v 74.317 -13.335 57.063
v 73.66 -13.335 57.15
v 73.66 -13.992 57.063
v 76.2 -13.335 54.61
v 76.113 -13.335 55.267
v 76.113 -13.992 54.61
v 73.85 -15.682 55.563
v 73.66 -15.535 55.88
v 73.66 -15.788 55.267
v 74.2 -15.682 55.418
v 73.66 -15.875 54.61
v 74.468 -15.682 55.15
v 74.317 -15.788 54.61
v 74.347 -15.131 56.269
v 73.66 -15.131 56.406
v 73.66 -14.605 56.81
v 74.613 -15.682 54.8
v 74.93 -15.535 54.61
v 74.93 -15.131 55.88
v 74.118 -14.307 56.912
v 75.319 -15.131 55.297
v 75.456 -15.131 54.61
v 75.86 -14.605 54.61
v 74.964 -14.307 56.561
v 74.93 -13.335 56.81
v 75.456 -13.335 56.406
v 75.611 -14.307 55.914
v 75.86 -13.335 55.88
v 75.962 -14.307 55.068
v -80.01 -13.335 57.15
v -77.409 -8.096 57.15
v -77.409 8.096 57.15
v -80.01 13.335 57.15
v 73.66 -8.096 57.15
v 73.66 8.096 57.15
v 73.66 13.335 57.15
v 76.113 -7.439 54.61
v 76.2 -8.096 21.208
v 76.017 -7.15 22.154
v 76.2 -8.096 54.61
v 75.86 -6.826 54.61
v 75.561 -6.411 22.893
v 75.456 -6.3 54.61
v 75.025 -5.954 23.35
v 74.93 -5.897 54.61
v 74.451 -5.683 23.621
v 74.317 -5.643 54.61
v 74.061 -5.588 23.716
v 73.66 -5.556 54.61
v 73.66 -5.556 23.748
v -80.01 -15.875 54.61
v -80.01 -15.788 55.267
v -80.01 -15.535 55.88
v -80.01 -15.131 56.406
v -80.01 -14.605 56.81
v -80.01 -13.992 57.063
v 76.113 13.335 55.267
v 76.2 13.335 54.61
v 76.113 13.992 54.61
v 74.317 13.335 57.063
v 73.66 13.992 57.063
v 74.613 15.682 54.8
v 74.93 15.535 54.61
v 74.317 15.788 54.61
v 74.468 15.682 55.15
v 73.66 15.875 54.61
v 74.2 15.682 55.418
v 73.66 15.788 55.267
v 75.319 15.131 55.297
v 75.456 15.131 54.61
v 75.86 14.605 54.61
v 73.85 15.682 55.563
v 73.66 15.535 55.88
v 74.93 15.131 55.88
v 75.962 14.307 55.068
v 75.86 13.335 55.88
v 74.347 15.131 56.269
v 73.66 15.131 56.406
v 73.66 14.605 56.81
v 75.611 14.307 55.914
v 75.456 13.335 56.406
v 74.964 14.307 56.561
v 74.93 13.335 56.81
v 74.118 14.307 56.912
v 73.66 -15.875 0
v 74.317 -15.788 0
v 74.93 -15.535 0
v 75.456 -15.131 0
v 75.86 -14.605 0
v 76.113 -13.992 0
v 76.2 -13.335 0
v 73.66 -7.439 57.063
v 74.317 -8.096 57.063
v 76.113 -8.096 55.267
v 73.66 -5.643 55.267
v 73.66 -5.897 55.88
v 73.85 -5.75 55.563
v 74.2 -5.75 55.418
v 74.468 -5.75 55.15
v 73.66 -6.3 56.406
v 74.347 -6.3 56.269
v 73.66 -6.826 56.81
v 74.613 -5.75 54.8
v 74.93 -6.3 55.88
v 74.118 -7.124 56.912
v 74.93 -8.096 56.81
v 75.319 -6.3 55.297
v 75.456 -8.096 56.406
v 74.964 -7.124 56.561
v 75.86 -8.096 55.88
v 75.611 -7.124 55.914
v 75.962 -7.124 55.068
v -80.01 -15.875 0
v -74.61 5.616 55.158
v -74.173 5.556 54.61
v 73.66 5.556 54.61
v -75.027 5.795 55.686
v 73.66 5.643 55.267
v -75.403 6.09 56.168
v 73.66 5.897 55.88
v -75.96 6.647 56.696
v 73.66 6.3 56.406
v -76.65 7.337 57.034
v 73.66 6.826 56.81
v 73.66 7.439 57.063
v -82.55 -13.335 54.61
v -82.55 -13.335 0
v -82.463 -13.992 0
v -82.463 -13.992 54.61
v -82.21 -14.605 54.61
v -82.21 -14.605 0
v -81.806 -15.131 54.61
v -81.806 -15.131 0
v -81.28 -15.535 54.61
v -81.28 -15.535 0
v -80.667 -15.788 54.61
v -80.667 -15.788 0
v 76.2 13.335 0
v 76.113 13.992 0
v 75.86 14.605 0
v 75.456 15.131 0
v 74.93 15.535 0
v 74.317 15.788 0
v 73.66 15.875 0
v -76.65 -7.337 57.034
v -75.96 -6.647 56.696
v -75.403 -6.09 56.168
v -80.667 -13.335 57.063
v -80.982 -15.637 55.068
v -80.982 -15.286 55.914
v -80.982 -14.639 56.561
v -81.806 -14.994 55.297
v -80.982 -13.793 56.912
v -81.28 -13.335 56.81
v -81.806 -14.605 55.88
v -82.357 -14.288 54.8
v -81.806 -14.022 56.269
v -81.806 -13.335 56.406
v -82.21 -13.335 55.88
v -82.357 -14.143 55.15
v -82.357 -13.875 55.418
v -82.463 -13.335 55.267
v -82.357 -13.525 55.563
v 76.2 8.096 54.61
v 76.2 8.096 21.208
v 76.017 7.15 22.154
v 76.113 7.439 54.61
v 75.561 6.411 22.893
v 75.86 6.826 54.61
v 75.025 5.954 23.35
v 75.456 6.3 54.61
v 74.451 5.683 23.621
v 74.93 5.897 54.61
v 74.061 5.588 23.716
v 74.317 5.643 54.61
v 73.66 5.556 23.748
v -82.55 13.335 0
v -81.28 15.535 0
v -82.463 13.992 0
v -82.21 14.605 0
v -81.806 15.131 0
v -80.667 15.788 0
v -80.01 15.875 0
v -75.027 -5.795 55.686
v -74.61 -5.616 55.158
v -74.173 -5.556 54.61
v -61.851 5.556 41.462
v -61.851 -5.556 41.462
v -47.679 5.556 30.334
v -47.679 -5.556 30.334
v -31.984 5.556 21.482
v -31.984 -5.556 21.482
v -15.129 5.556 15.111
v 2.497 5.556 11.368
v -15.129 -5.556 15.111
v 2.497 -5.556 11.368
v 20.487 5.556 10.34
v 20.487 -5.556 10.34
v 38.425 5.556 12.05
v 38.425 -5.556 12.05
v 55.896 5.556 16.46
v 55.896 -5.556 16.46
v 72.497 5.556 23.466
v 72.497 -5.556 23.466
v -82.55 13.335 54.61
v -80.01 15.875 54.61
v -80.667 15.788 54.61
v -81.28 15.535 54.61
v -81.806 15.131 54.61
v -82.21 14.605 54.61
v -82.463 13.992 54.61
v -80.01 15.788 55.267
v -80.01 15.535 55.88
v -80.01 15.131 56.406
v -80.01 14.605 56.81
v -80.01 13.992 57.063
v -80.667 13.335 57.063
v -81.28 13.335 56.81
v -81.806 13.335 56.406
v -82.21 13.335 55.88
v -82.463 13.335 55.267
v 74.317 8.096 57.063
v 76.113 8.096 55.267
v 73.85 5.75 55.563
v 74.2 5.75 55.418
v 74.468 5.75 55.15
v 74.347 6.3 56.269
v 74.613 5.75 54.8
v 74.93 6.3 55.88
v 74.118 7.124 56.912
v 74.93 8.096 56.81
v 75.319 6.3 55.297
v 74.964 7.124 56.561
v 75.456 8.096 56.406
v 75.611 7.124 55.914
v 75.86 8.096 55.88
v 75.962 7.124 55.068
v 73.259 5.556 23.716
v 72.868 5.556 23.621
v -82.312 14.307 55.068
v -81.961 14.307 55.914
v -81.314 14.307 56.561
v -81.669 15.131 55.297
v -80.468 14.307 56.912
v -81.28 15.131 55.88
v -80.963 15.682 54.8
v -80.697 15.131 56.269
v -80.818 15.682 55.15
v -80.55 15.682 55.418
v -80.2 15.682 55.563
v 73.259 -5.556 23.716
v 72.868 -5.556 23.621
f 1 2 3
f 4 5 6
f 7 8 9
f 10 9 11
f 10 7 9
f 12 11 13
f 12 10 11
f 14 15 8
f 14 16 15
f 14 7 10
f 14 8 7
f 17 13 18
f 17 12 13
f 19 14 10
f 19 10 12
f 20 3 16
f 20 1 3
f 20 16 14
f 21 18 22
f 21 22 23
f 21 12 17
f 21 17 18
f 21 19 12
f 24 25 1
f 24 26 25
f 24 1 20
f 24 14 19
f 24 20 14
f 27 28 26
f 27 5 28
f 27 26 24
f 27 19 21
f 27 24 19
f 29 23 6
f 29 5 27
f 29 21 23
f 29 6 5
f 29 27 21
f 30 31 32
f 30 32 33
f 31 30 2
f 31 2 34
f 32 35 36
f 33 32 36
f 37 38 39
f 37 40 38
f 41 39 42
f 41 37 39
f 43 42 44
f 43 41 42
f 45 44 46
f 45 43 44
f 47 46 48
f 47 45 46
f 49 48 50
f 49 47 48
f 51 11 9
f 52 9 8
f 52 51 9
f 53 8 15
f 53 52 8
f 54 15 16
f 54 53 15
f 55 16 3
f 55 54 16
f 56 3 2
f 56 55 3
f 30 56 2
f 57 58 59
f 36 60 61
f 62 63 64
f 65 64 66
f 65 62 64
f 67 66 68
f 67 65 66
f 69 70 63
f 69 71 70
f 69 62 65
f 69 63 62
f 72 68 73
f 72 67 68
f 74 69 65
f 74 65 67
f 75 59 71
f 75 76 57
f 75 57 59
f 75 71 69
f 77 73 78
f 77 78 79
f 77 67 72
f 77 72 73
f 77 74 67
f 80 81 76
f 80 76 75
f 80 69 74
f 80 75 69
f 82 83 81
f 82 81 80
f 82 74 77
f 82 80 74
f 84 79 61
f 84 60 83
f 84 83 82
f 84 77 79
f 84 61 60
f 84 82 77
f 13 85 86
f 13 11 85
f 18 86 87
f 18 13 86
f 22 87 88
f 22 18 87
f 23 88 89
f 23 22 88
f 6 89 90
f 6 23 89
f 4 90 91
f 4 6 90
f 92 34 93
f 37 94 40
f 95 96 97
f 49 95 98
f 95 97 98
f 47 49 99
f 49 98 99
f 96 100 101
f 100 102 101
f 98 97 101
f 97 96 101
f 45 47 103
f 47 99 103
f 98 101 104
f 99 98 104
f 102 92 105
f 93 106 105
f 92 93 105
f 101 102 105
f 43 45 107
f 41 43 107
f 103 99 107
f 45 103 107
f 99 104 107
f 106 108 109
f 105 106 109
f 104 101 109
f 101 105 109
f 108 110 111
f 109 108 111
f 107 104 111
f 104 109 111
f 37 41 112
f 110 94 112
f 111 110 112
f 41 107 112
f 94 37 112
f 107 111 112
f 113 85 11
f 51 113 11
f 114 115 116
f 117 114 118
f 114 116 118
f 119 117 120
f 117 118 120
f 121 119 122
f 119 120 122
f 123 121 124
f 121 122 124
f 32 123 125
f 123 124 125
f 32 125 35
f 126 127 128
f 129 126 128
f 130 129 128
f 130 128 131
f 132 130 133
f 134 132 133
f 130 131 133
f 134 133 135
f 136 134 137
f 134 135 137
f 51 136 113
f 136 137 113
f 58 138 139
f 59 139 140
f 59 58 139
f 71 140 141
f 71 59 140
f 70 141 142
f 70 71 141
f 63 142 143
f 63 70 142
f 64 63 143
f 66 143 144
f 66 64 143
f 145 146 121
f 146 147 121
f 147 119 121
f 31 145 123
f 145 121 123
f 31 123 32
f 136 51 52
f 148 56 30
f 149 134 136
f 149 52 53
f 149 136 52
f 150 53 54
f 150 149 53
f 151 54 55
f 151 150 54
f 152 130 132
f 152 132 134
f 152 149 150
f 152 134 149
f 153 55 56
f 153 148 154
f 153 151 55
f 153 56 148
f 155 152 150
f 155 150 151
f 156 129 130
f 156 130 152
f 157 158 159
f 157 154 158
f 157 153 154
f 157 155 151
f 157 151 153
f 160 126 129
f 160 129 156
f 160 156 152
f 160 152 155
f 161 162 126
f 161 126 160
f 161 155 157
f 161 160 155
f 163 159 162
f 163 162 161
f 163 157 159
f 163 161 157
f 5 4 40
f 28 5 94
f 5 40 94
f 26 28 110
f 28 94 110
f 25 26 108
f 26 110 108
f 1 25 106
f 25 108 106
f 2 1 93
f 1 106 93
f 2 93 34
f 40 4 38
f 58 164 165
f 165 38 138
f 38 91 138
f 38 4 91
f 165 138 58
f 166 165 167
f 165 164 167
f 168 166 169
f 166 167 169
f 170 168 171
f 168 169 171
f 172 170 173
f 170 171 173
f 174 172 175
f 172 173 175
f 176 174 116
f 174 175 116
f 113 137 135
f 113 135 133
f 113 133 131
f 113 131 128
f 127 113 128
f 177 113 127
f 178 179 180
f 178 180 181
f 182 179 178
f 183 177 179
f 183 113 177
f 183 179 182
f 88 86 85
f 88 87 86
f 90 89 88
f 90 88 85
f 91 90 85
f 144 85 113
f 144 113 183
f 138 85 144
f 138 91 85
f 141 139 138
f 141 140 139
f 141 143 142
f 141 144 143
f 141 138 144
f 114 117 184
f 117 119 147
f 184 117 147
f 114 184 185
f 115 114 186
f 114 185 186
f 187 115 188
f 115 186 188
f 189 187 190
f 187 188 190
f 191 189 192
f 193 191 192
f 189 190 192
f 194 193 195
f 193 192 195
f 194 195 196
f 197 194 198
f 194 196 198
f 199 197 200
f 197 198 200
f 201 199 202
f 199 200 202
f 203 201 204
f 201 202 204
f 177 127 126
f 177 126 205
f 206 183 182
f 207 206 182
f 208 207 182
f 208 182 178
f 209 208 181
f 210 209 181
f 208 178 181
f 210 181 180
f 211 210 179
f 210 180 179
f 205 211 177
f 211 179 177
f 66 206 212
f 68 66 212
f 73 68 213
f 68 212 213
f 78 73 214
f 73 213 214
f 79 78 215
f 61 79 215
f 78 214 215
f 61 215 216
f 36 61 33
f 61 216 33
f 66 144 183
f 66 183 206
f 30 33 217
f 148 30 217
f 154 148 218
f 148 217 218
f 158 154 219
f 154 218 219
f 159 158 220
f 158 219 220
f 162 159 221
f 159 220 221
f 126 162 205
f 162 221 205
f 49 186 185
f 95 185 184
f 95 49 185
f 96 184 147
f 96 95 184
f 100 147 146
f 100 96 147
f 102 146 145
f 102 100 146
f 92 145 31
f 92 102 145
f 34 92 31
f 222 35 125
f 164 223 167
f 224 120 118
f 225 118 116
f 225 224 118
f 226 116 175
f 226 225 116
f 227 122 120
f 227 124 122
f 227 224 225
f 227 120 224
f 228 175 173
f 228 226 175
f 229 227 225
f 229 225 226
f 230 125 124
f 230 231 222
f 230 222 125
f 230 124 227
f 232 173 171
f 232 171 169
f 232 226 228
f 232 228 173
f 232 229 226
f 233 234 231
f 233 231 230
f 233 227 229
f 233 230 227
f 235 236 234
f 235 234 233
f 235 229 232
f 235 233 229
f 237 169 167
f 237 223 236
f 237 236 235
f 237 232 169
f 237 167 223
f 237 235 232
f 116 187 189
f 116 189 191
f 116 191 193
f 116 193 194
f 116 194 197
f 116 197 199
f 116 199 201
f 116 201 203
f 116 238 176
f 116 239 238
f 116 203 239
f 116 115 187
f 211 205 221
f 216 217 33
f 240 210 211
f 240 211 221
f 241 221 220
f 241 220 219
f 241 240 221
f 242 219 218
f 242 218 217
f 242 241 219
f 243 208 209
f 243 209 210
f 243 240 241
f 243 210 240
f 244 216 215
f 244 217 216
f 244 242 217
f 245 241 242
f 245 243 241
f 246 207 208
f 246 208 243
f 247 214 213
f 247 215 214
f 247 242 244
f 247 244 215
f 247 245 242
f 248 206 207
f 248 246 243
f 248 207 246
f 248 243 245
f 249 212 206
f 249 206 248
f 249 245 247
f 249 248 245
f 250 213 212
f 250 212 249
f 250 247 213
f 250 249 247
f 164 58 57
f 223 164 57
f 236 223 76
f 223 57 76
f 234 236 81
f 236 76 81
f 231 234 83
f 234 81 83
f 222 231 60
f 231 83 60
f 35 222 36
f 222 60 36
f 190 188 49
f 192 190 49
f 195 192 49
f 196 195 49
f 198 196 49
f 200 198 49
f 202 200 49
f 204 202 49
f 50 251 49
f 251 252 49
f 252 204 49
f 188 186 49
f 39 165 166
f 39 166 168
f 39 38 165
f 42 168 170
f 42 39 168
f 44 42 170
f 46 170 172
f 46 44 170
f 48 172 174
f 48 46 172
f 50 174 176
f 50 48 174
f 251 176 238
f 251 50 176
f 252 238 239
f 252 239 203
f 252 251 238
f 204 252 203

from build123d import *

# Parameters (mm, degrees)
F0_W          = 152.4
F0_H          = 31.75
F1_DEPTH      = 57.15
F3_DEPTH      = 5.55625
F3_DEPTH_BACK = 5.55625
F4_DEPTH      = 6.35
F5_R          = 2.54
F6_T1_DEPTH   = 60.96
F6_S5_W       = 2.54
F6_S5_H       = 2.54
F6_T6_DEPTH   = 2.54
F6_S11_W      = 2.54
F6_S11_H      = 2.54
F6_T12_DEPTH  = 2.54


# Not quite as in the source:
# - a fillet or chamfer that OpenCascade refuses, or shapes differently, is made with other operations: its cross-section is extruded or revolved along the edge and cut away or added


with BuildPart() as f1:
    # F0 (on Top) → F1 (new body)
    with BuildSketch(Plane.XY):
        Rectangle(F0_W, F0_H)
    extrude(amount=F1_DEPTH)

    # F2 (on Front) → F3 (cut, two sides)
    with BuildSketch(Plane.XZ) as f3_sk:
        with BuildLine():
            Line((76.2, 57.2062885404), (0, 57.2062885404))
            Line((0, 57.2062885404), (-76.2, 57.2062885404))
            ThreePointArc((-76.2, 57.2062885404), (-5.9418927192, 12.810203488), (76.2, 25.4562885404))
            Line((76.2, 25.4562885404), (76.2, 57.2062885404))
        make_face()
    extrude(amount=F3_DEPTH, mode=Mode.SUBTRACT)
    extrude(f3_sk.sketch, amount=-F3_DEPTH_BACK, mode=Mode.SUBTRACT)

    # F4 (add): a face of the model
    f4_faces = [f1.faces().sort_by_distance(p)[0] for p in [
        (-76.2, 0, 28.575),
    ]]
    extrude(f4_faces, amount=F4_DEPTH)

    # F5
    f5_edges = [f1.edges().sort_by_distance(p)[0] for p in [
        (76.2, -10.715625, 57.15),
        (-3.175, -15.875, 57.15),
        (76.2, -15.875, 28.575),
        (76.2, 10.715625, 57.15),
        (76.2, 15.875, 28.575),
        (-3.175, 15.875, 57.15),
        (-82.55, 0, 57.15),
        (0.021369, -5.55625, 57.15),
        (-76.157263, 0, 57.15),
        (0.021369, 5.55625, 57.15),
        (76.2, 5.55625, 41.303144),
        (76.2, -5.55625, 41.303144),
        (76.2, 0, 25.456289),
    ]]
    fillet(f5_edges, radius=F5_R)

    # F6: fillet of radius 2.54 on 2 edges, made by hand

    # F6_s2 → F6_t1 (cut)
    with BuildSketch(Plane.XY.offset(-6.35)):
        with BuildLine():
            ThreePointArc((-80.01, 15.875), (-81.8060512242, 15.1310512242), (-82.55, 13.335))
            Line((-82.55, 13.335), (-82.55, 15.875))
            Line((-82.55, 15.875), (-80.01, 15.875))
        make_face()
        with BuildLine():
            ThreePointArc((-82.55, -13.335), (-81.8060512242, -15.1310512242), (-80.01, -15.875))
            Line((-80.01, -15.875), (-82.55, -15.875))
            Line((-82.55, -15.875), (-82.55, -13.335))
        make_face()
    extrude(amount=F6_T1_DEPTH, mode=Mode.SUBTRACT)


with BuildPart() as f6_tool4:
    # F6_s5 → F6_t6 (new body)
    with BuildSketch(Plane.YZ.offset(-80.01)):
        with Locations((-14.605, 55.88)):
            Rectangle(F6_S5_W, F6_S5_H)
    extrude(amount=-F6_T6_DEPTH)

    # F6_s7 → F6_t8 (revolve, cut)
    with BuildSketch(Plane(origin=(-80.01, -13.335, 54.61), x_dir=(0, 0.7071067812, -0.7071067812), z_dir=(0, 0.7071067812, 0.7071067812))):
        with BuildLine():
            ThreePointArc((0, -2.54), (2.54, 0), (0, 2.54))
            Line((0, 2.54), (0, -2.54))
        make_face()
    revolve(axis=Axis((-80.01, -13.335, 54.61), (-1, 0, 0)), mode=Mode.SUBTRACT)


with BuildPart() as f1_1:
    add(f1.part)

    # F6_t3: cut F6_tool4
    add(f6_tool4.part, mode=Mode.SUBTRACT)


with BuildPart() as f6_tool10:
    # F6_s11 → F6_t12 (new body)
    with BuildSketch(Plane.XZ.offset(-13.335)):
        with Locations((-81.28, 55.88)):
            Rectangle(F6_S11_W, F6_S11_H)
    extrude(amount=-F6_T12_DEPTH)

    # F6_s13 → F6_t14 (revolve, cut)
    with BuildSketch(Plane(origin=(-80.01, 13.335, 54.61), x_dir=(0.7071067812, 0, -0.7071067812), z_dir=(0.7071067812, 0, 0.7071067812))):
        with BuildLine():
            ThreePointArc((0, -2.54), (2.54, 0), (0, 2.54))
            Line((0, 2.54), (0, -2.54))
        make_face()
    revolve(axis=Axis((-80.01, 13.335, 54.61), (0, 1, 0)), mode=Mode.SUBTRACT)


with BuildPart() as f1_2:
    add(f1_1.part)

    # F6_t9: cut F6_tool10
    add(f6_tool10.part, mode=Mode.SUBTRACT)


solid = f1_2.part
